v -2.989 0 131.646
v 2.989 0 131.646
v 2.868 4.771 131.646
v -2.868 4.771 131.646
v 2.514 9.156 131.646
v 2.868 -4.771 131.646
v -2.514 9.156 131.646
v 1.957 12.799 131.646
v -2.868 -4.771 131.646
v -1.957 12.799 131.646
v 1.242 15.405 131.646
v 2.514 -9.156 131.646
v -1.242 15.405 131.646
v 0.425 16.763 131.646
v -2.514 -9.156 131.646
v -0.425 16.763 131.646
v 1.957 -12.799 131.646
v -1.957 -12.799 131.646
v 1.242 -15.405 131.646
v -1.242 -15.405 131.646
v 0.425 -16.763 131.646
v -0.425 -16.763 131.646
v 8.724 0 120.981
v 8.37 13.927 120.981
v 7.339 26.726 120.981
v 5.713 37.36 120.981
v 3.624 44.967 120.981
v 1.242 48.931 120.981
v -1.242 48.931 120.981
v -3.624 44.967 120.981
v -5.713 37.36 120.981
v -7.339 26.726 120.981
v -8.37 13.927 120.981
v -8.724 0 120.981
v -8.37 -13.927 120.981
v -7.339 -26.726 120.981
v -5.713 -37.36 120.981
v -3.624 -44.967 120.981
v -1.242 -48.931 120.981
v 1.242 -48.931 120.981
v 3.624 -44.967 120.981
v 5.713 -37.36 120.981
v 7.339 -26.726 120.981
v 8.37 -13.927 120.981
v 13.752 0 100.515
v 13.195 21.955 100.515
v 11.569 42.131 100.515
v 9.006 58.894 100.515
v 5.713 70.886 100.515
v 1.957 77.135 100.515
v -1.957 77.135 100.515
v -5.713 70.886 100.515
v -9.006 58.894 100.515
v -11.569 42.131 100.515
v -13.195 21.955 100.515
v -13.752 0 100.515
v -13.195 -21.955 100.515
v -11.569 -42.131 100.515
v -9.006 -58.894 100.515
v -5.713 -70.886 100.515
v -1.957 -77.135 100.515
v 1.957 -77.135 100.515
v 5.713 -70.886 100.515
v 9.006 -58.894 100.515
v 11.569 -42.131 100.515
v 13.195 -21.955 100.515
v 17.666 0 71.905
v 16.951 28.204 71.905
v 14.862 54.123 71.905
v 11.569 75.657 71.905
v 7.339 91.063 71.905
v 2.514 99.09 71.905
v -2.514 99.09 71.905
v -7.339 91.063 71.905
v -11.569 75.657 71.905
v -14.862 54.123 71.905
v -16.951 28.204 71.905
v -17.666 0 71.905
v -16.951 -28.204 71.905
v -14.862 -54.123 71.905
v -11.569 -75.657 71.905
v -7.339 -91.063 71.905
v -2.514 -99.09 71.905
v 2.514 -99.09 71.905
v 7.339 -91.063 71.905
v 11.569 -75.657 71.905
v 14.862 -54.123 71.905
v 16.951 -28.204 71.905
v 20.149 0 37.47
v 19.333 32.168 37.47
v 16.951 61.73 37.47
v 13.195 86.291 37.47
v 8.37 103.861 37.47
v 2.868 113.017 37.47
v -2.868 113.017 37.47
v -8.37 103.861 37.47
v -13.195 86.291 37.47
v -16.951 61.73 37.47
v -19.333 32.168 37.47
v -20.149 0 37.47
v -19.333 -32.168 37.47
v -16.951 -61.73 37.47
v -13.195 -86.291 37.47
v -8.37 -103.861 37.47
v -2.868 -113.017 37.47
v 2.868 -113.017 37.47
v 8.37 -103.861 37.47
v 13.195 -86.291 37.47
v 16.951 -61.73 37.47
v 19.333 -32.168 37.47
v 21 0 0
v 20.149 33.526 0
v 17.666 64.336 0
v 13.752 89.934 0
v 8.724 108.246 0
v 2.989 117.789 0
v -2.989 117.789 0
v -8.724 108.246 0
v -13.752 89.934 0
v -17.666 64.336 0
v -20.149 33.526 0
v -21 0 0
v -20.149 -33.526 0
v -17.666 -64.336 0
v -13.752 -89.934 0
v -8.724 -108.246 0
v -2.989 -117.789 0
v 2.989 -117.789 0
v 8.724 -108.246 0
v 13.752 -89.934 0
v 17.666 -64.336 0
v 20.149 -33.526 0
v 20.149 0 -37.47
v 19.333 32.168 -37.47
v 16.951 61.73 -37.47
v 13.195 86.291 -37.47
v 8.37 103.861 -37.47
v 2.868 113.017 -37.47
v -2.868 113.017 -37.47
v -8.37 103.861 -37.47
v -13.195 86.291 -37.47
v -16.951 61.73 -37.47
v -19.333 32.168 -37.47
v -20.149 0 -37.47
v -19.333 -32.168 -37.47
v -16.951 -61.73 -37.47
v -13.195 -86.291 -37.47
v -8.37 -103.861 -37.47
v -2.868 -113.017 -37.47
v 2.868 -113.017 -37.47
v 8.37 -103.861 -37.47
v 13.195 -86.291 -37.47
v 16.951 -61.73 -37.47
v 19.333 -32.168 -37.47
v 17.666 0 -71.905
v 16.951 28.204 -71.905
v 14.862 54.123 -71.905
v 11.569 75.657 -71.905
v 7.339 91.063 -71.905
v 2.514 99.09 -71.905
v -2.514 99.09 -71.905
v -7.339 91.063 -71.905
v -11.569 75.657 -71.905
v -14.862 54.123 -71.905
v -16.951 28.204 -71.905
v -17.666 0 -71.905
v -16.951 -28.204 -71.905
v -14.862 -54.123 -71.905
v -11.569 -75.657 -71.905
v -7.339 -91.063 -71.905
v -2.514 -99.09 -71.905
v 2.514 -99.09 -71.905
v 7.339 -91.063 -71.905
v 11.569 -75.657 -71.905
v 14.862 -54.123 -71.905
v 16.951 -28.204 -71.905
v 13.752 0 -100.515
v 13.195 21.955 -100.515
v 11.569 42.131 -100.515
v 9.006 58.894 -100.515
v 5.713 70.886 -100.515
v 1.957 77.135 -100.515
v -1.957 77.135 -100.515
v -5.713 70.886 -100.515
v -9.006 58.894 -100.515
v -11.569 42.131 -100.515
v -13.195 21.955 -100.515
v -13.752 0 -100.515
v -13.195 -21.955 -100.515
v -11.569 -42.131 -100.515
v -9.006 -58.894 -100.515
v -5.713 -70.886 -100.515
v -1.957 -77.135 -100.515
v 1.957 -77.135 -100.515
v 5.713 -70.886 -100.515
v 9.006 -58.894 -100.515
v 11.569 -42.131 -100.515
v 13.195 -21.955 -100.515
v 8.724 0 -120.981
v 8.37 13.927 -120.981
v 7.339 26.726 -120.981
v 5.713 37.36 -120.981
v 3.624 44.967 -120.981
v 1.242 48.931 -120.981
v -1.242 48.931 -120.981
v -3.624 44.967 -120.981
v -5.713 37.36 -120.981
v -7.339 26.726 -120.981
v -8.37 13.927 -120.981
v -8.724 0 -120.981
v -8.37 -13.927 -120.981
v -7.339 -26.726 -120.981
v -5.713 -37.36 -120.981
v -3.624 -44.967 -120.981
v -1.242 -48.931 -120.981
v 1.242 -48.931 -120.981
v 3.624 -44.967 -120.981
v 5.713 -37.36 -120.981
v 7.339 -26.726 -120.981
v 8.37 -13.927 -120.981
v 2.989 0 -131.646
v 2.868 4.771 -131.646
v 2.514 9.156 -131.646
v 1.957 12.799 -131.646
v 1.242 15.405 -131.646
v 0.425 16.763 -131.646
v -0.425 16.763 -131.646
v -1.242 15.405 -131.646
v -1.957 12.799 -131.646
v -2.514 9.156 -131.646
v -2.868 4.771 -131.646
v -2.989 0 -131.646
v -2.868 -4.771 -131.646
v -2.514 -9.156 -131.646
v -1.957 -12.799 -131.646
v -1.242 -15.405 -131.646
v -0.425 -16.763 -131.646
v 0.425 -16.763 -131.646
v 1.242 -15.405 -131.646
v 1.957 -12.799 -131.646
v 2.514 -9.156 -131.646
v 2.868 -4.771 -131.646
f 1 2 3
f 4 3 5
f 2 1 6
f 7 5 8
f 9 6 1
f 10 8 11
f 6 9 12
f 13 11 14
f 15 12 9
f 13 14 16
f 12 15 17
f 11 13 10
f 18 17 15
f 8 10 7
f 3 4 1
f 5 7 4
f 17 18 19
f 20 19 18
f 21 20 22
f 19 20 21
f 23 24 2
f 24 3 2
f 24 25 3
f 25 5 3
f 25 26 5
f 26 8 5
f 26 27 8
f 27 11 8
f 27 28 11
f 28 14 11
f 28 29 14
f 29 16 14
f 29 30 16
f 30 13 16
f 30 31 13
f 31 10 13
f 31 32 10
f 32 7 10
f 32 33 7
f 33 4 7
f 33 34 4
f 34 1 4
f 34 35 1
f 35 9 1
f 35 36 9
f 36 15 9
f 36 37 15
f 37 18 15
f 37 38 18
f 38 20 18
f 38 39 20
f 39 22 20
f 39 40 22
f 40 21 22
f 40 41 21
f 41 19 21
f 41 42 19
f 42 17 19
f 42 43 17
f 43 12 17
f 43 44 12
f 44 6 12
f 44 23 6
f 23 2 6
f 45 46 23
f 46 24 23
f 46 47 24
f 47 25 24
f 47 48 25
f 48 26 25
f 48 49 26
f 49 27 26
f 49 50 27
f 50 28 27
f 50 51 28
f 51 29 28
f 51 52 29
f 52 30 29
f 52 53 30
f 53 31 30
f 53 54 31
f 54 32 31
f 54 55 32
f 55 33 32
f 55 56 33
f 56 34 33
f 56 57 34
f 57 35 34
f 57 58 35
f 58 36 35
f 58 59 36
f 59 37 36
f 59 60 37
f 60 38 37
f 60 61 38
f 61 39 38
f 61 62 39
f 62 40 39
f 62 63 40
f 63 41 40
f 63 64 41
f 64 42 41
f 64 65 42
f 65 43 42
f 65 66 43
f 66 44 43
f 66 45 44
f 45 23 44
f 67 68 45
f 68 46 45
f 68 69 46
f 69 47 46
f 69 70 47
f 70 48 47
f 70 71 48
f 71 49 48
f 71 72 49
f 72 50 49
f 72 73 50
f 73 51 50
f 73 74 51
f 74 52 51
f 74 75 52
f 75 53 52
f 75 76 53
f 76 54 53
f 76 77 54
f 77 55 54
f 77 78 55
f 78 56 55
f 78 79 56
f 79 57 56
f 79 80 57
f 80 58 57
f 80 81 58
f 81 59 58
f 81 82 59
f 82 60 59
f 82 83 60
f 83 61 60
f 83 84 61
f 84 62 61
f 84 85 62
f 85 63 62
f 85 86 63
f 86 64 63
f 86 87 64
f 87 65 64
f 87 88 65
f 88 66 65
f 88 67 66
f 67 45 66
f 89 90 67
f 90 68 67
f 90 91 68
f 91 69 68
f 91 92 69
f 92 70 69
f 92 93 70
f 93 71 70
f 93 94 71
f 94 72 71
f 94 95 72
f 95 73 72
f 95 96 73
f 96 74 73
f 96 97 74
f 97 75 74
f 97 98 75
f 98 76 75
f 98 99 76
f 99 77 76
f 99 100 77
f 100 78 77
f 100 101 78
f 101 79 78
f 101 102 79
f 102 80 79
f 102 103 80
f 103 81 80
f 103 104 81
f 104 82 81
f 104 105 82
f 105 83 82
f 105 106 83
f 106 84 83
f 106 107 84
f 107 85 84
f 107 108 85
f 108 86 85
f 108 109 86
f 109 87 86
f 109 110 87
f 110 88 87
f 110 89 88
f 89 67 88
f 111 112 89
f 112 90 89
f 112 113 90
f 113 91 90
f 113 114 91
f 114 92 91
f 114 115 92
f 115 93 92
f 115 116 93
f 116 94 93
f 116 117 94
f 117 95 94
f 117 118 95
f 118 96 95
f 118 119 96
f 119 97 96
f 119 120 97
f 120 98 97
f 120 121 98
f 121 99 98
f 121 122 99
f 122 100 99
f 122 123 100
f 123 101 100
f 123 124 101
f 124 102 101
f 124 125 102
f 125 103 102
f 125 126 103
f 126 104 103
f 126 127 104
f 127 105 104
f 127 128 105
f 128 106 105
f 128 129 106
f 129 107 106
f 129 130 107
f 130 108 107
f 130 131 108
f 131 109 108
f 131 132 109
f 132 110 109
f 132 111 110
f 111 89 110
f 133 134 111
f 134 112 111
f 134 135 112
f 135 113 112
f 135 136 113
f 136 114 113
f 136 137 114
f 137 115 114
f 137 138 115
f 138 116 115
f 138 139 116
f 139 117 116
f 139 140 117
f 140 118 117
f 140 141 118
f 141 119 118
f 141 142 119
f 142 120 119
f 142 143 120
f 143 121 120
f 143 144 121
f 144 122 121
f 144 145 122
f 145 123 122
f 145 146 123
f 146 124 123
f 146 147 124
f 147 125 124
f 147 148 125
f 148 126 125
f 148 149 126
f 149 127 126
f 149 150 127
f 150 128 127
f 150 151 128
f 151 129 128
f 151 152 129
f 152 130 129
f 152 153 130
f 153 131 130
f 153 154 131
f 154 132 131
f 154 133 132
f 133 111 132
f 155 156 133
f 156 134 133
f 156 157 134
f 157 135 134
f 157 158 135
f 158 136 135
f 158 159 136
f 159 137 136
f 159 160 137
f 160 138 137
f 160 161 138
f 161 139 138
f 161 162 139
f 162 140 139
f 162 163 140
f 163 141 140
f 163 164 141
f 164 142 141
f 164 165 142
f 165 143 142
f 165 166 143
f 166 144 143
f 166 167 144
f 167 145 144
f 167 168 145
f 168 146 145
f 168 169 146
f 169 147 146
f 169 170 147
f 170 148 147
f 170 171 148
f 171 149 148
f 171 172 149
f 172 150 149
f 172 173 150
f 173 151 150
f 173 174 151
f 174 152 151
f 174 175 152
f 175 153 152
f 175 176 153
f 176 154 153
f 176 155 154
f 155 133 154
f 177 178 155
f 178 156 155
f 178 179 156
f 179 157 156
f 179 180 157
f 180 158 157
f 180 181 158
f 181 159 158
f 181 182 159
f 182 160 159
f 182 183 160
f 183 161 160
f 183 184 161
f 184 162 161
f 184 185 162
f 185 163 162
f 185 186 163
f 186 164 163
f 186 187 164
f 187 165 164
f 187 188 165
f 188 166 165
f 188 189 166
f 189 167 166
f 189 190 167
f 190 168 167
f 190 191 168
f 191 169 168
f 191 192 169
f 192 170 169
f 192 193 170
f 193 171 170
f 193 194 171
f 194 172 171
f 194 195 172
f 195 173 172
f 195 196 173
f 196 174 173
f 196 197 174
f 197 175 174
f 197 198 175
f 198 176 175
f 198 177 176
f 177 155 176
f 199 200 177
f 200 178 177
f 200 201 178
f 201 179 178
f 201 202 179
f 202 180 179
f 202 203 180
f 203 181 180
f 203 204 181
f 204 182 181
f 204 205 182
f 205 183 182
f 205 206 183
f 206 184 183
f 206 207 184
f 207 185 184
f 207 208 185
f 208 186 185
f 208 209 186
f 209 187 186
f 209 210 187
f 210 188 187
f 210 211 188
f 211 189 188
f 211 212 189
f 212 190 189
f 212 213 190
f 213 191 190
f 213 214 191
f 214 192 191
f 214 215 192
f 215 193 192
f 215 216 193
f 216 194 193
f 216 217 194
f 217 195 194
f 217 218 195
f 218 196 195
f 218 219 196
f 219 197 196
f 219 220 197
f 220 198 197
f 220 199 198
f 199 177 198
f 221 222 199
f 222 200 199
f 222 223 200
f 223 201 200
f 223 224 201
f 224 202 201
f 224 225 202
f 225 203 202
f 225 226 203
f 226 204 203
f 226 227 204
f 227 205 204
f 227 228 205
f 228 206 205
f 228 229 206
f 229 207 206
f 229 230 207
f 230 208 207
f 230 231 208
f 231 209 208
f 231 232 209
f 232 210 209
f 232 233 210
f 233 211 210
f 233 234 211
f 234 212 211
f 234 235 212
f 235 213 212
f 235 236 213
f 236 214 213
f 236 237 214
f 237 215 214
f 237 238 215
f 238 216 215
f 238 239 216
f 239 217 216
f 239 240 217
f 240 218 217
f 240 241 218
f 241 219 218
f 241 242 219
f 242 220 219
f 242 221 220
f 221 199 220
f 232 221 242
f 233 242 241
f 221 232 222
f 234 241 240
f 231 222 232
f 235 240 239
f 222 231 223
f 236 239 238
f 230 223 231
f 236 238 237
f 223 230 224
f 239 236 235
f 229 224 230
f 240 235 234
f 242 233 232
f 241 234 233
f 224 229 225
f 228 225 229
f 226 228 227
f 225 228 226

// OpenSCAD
// Generated by SolidPython 1.0.1 on 2020-07-29 00:46:46


scale(v = [3, 17, 19]) {
	sphere(r = 7);
}
/***********************************************
*********      SolidPython code:      **********
************************************************
 
# import packages: SolidPython
from solid import *
from solid.utils import *
from itertools import chain, combinations, permutations


class Resize:

    def __init__(self, scad_file):
        self.scad_file = scad_file
        #self.scad_file = import_scad(scad_file)
        # cone/cylinder param:
        self.r1 = 0
        self.r2 = 0
        self.h = 0
        # rectangular prism param:
        self.w = 0
        self.l = 0
        # ellipse param:
        self.r = 0

    # import OpenScad code (file name corresponds to shape)


    # classify shape + parameters
    def assign(self, param1, param2, param3):
        if self.scad_file == 'cone.scad':
            self.r1 = param1
            self.r2 = param2
            self.h = param3
        elif self.scad_file == 'cylinder.scad':
            self.r1 = param1
            self.r2 = param2
            self.h = param3
        elif self.scad_file == 'rectangularPrism.scad':
            self.h = param1
            self.l = param2
            self.w = param3
        else:
            self.r = param1
            self.h = param2

    # resize parameters
    def iterate(self):
        x = range(3, 20, 2)
        i = 1
        if self.scad_file == 'cone.scad':
            tempList = list(permutations(x, 2))
            for temp in tempList:
                param1 = temp[0]
                param2 = temp[1]
                filepath = 'produced_scad_files/' + 'cone' + str(param1) + '_' + str(param2) + '_' + '.scad'
                scad_render_to_file(cylinder(h=param1, r1=param2, r2=0), filepath)

        elif self.scad_file == 'cylinder.scad':
            tempList = list(permutations(x, 3))
            for temp in tempList:
                param1 = temp[0]
                param2 = temp[1]
                filepath = 'produced_scad_files/' + 'cylinder' + str(param1) + '_' + str(param2) + '_' + '.scad'
                scad_render_to_file(cylinder(h=param1, r1=param2, r2=param2), filepath)

        elif self.scad_file == 'rectangularPrism.scad':
            tempList = list(permutations(x, 3))
            for temp in tempList:
                param1 = temp[0]
                param2 = temp[1]
                param3 = temp[2]
                filepath = 'produced_scad_files/' + 'rectangularPrism' + str(param1) + '_' + str(param2) + '_' + str(
                    param3) + '.scad'
                scad_render_to_file(cube(size=(param1, param2, param3)), filepath)

        elif self.scad_file == 'ellipse.scad':
            tempList = list(permutations(x, 4))
            for temp in tempList:
                param1 = temp[0]
                param2 = temp[1]
                param3 = temp[2]
                param4 = temp[3]
                filepath = 'produced_scad_files/' + 'ellipse' + str(param1) + '_' + str(param2) + '_' + str(param3) + '_' + str(param4) + '.scad'
                scad_render_to_file(scale([param1, param2, param3])(sphere(r=param4)), filepath)

    def render_to_scadfile(self):
        scad_render_to_file(scad, 'example.scad') 
 
************************************************/
